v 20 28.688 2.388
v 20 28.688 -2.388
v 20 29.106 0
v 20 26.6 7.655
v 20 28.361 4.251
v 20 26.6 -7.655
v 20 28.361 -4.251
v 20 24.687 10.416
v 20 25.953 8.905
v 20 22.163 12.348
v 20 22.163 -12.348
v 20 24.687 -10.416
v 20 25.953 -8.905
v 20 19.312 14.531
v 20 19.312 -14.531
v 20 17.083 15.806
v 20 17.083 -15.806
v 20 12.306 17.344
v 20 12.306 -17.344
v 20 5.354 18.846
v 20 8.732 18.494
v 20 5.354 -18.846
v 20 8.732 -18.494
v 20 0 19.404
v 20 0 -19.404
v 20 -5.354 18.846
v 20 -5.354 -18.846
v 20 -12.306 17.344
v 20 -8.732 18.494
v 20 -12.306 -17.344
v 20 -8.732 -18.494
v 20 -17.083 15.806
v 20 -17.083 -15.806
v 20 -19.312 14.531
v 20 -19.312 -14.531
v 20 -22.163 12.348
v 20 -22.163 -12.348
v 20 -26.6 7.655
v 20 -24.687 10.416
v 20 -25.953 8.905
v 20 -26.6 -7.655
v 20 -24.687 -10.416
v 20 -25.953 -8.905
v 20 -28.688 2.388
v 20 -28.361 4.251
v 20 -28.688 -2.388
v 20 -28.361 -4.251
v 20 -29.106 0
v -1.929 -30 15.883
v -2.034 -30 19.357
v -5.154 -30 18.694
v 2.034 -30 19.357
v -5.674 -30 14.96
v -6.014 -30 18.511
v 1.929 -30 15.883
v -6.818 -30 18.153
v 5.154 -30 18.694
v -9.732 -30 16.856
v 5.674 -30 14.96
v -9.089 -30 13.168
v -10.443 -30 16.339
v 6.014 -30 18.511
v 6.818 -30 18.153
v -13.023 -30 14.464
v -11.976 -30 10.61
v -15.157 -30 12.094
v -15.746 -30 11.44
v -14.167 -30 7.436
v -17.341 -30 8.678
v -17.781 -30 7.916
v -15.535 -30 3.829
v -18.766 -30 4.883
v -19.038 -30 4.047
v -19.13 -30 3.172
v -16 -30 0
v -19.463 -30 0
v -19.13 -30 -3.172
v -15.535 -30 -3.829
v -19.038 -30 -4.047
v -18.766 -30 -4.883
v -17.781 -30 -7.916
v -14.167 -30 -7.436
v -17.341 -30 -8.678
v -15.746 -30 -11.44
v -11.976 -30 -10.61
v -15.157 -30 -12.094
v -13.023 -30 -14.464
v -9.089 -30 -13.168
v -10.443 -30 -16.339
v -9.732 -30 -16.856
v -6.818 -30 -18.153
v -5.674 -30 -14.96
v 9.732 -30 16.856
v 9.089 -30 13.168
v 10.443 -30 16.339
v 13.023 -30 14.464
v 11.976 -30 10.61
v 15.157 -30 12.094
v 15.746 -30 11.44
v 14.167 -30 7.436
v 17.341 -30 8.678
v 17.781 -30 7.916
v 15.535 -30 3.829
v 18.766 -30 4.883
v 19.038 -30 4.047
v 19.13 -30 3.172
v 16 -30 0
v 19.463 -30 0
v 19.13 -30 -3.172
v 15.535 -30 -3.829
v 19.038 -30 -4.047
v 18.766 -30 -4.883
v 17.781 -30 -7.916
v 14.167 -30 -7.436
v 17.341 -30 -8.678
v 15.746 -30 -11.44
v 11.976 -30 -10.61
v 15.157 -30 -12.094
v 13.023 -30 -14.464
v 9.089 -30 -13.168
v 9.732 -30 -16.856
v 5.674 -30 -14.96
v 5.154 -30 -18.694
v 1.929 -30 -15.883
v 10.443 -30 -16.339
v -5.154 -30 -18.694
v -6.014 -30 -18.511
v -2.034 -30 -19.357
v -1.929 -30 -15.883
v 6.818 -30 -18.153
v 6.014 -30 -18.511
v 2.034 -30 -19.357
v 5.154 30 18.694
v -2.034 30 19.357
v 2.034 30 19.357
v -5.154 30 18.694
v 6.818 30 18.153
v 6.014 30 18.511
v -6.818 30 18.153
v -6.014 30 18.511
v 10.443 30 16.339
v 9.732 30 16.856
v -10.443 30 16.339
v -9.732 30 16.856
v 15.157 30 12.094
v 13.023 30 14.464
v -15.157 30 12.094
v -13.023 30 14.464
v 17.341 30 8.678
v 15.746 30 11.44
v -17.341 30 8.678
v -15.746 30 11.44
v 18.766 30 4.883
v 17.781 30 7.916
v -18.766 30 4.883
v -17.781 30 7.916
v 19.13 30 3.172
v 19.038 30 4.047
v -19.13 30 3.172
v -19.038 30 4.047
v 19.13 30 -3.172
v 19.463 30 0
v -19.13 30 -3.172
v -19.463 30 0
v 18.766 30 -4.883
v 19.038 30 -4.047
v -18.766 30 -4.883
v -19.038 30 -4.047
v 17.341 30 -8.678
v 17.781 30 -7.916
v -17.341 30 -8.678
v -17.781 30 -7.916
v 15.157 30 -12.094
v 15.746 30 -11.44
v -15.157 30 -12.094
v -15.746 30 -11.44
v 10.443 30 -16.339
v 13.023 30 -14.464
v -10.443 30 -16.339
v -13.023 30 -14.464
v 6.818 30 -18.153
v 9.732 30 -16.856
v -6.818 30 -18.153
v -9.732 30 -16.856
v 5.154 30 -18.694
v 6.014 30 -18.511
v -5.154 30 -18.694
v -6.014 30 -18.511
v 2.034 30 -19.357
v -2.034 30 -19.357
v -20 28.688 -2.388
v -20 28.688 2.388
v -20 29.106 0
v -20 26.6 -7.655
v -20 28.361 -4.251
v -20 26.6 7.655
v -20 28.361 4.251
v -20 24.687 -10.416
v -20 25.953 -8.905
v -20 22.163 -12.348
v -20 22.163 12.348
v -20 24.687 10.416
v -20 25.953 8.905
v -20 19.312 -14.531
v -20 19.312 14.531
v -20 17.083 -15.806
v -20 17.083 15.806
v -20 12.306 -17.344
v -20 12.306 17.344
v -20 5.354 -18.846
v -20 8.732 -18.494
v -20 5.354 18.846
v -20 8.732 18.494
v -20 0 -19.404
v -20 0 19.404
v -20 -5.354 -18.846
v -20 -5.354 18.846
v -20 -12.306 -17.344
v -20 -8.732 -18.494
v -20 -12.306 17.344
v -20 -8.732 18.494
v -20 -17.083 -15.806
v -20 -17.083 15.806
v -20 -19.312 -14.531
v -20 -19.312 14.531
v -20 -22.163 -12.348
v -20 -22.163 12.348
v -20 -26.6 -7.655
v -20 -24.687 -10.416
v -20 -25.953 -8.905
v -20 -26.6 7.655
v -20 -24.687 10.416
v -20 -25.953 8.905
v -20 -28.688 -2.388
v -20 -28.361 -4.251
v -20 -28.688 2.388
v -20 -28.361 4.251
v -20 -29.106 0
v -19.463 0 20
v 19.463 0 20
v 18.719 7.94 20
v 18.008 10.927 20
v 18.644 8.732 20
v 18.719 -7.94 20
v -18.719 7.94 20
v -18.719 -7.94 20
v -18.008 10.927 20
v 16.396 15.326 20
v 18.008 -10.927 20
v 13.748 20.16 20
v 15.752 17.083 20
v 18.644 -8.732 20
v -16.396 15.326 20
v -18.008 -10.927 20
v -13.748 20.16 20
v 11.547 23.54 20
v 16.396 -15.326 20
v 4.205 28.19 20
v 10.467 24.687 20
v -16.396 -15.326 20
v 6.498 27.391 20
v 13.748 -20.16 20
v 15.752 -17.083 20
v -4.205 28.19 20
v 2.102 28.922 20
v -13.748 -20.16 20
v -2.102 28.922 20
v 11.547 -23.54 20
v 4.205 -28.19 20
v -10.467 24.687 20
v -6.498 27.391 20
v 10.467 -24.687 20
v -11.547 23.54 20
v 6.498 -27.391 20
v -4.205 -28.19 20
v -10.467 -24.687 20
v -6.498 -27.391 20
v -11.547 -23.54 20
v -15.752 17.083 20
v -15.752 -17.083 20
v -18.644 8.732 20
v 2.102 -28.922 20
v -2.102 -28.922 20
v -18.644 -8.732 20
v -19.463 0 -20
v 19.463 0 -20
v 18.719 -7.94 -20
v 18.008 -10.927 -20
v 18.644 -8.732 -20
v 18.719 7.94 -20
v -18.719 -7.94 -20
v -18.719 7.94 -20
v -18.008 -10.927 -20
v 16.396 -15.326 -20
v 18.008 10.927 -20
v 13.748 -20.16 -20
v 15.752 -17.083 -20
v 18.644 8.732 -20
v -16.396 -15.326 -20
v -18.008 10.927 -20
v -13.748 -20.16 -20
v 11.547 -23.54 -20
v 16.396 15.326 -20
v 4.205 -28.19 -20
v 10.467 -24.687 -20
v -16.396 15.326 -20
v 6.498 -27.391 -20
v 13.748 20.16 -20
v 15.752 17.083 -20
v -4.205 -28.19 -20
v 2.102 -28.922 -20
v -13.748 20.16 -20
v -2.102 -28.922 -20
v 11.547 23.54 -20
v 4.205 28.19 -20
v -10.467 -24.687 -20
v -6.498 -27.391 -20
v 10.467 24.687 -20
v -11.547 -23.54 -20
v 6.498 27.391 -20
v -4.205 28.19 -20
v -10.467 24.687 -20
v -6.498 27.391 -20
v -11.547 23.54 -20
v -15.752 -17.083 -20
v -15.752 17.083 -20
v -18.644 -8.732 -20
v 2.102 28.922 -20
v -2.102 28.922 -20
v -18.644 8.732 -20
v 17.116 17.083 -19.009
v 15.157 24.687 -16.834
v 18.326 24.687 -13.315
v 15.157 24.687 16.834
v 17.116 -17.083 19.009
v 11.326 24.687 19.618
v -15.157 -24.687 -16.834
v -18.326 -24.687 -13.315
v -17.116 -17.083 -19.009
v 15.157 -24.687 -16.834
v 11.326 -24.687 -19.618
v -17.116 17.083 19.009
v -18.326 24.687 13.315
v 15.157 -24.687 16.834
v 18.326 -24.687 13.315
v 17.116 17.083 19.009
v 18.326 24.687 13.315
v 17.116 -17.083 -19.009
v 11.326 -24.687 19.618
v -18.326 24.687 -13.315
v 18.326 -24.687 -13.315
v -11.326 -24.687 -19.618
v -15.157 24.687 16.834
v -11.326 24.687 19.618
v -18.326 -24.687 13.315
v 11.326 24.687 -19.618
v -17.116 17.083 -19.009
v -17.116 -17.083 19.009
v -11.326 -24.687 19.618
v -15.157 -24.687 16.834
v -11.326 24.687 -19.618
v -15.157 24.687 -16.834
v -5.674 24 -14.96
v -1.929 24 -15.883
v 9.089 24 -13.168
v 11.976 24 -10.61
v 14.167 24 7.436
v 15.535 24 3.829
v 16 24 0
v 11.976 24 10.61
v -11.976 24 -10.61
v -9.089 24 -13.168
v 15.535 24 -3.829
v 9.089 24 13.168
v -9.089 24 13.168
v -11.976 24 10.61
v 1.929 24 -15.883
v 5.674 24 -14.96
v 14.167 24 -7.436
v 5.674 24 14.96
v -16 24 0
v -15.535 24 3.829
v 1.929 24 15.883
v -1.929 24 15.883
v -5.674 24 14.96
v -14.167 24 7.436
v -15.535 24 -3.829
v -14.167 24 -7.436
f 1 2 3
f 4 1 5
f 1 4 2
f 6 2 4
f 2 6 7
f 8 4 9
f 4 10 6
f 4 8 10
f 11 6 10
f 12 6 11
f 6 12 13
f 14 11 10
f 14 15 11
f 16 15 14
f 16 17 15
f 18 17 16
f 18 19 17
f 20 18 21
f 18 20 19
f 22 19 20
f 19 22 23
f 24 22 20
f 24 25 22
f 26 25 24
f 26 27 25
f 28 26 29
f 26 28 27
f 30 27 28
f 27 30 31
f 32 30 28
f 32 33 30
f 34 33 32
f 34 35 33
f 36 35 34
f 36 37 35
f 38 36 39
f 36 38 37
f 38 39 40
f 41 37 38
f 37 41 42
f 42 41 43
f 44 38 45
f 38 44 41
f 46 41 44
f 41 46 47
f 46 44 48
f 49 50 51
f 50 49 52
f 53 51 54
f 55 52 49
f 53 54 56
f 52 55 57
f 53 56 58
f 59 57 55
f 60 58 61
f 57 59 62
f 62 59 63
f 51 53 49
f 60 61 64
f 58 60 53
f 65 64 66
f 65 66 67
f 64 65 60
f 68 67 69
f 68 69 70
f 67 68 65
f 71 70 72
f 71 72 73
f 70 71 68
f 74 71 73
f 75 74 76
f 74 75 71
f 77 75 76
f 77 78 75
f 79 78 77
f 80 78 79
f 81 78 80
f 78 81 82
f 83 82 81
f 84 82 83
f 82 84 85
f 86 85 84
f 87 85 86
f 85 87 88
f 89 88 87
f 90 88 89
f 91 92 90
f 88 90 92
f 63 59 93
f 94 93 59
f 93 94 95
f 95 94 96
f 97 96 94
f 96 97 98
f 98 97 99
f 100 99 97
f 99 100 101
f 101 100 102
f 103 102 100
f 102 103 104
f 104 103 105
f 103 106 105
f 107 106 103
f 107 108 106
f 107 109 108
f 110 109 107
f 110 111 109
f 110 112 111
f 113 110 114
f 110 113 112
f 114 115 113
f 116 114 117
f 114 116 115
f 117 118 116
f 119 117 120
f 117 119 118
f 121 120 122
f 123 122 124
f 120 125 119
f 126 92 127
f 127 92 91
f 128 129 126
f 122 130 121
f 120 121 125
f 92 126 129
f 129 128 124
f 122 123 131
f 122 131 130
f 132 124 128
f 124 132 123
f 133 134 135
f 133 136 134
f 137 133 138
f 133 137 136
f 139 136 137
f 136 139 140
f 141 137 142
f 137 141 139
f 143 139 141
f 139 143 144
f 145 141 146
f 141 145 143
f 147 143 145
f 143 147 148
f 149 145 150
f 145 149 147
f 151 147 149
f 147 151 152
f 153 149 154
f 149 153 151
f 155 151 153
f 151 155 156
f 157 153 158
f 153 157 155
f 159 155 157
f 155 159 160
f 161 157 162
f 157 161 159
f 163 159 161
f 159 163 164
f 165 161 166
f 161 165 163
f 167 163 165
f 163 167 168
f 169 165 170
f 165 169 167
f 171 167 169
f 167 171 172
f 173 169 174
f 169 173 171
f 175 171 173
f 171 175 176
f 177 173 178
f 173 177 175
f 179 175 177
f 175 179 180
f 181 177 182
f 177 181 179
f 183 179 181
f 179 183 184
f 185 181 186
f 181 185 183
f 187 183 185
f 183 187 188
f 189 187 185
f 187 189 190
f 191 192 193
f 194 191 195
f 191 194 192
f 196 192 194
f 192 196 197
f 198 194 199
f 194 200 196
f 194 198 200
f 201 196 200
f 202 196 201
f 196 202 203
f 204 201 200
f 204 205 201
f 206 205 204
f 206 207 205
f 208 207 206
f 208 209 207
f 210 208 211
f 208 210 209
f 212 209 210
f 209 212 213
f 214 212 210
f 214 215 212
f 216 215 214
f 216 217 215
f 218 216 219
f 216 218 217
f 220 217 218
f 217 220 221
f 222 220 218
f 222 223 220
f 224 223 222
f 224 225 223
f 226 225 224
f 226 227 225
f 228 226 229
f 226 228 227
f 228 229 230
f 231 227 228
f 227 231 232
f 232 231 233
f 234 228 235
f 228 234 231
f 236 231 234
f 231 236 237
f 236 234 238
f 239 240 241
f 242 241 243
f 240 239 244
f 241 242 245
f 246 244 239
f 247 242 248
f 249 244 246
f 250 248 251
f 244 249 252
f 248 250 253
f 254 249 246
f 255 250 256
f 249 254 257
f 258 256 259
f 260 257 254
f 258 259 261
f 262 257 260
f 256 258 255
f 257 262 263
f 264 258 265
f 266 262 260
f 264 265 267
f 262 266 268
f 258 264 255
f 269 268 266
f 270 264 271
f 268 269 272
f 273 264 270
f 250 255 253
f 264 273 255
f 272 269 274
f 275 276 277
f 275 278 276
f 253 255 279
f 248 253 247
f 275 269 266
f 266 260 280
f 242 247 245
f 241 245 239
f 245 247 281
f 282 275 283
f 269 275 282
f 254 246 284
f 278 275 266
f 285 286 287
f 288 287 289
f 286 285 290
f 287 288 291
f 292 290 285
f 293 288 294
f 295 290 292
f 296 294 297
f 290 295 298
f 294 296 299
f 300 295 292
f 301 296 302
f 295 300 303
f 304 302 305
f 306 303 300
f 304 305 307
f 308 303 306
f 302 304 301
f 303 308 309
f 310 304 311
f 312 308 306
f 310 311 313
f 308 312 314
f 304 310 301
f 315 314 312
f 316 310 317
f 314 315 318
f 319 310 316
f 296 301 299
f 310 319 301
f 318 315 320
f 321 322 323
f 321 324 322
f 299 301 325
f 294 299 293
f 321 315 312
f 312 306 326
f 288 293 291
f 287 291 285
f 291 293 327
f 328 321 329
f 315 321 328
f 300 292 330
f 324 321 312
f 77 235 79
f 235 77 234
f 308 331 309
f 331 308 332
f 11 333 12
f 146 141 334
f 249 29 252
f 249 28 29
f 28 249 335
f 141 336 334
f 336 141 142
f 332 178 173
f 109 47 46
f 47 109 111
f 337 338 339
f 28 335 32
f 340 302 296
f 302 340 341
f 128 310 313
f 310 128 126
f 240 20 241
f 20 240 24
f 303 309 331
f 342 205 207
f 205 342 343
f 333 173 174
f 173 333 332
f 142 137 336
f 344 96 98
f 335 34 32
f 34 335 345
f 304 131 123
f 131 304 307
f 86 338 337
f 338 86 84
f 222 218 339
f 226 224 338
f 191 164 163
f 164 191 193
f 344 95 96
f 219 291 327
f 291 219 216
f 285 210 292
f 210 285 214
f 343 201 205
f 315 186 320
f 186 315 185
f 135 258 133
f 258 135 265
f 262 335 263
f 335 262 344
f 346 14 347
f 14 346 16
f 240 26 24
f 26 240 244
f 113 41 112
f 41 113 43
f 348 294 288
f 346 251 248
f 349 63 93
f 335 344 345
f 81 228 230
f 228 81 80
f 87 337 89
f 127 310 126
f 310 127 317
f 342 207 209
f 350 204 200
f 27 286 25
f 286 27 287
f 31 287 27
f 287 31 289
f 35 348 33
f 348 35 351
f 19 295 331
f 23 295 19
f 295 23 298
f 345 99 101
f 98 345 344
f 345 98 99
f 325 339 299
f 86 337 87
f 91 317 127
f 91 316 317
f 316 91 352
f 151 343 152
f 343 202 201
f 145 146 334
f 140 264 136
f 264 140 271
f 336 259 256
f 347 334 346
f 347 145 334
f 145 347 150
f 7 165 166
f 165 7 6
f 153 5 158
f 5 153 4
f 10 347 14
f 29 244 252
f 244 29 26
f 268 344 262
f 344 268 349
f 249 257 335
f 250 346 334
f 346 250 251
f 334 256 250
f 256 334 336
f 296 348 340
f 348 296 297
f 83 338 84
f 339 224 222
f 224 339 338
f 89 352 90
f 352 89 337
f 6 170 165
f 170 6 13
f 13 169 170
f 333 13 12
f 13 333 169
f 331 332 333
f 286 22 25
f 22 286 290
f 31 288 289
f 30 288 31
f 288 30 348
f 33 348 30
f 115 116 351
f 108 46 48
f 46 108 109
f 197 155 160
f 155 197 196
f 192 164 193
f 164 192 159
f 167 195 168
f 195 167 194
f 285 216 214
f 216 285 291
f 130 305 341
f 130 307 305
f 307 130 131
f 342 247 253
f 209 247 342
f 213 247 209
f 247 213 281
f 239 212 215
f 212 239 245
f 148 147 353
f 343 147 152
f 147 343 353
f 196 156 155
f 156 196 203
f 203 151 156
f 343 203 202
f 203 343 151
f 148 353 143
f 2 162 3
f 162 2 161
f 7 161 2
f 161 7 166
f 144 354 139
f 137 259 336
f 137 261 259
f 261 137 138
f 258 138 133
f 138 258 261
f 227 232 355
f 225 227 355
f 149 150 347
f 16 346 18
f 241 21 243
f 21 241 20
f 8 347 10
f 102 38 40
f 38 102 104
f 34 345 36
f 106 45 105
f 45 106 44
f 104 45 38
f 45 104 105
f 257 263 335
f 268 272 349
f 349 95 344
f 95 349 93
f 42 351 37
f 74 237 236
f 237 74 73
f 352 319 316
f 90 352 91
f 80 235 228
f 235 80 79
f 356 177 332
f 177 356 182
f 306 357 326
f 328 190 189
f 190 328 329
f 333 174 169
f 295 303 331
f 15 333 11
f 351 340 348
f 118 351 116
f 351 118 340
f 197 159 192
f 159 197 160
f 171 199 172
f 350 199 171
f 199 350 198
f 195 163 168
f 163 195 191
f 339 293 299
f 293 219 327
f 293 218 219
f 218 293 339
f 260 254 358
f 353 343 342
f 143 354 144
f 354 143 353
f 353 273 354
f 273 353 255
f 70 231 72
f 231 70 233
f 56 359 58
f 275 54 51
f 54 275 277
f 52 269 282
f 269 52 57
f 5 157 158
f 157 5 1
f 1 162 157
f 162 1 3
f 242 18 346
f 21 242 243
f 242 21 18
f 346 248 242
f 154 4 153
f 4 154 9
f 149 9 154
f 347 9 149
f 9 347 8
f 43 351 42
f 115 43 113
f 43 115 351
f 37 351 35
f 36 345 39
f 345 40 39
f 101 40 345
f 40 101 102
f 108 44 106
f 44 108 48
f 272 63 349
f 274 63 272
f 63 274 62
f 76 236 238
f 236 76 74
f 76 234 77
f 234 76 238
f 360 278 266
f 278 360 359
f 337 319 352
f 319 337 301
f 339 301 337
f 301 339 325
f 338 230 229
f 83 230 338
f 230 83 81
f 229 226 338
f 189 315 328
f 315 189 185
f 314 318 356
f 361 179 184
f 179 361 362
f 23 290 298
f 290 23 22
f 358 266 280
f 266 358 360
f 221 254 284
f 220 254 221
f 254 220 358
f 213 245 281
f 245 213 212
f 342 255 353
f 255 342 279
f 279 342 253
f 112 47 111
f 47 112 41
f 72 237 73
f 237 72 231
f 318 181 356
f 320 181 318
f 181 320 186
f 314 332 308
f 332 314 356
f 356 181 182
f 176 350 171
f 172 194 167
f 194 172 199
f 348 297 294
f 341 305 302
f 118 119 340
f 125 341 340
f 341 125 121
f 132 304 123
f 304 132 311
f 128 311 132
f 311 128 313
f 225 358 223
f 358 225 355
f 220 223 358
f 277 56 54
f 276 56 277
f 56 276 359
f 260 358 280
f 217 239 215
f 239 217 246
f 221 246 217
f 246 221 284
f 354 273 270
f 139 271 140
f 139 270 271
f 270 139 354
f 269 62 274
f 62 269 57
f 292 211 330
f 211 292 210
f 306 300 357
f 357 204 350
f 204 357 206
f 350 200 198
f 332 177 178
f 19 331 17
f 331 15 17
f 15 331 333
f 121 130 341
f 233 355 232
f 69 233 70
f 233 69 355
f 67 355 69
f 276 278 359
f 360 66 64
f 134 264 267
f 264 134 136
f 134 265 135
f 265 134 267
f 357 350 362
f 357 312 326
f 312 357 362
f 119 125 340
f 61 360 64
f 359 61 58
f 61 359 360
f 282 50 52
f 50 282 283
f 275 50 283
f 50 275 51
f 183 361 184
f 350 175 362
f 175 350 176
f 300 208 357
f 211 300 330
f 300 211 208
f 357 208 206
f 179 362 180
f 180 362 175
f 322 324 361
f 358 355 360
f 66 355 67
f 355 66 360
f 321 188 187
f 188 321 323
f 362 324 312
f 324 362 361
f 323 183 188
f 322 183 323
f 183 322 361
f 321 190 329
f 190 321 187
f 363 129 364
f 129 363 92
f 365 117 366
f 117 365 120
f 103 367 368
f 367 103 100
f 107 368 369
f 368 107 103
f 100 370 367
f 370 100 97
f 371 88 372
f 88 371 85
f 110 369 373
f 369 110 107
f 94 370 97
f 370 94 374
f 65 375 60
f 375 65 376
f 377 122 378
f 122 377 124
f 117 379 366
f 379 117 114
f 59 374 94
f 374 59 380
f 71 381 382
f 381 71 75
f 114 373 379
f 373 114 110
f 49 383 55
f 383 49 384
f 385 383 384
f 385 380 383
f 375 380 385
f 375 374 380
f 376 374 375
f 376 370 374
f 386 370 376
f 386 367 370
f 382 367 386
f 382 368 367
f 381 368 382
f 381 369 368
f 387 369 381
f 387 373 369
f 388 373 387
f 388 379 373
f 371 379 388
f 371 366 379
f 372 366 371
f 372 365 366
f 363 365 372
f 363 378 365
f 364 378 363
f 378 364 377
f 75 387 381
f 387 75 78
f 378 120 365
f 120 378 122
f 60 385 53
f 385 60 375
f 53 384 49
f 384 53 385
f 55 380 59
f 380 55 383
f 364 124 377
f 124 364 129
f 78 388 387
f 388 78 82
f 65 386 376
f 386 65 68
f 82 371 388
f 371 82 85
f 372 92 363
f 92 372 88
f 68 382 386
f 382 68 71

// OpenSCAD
rotate([90,0,0]) {
union() {
scale([2,2,3]) {
difference() {
    intersection() {
      cube([20,20,20], center=true);
      sphere(14);
    }
    translate([0,0,-8]) 
        cylinder(r=8,h=22);
}
}
}
}
